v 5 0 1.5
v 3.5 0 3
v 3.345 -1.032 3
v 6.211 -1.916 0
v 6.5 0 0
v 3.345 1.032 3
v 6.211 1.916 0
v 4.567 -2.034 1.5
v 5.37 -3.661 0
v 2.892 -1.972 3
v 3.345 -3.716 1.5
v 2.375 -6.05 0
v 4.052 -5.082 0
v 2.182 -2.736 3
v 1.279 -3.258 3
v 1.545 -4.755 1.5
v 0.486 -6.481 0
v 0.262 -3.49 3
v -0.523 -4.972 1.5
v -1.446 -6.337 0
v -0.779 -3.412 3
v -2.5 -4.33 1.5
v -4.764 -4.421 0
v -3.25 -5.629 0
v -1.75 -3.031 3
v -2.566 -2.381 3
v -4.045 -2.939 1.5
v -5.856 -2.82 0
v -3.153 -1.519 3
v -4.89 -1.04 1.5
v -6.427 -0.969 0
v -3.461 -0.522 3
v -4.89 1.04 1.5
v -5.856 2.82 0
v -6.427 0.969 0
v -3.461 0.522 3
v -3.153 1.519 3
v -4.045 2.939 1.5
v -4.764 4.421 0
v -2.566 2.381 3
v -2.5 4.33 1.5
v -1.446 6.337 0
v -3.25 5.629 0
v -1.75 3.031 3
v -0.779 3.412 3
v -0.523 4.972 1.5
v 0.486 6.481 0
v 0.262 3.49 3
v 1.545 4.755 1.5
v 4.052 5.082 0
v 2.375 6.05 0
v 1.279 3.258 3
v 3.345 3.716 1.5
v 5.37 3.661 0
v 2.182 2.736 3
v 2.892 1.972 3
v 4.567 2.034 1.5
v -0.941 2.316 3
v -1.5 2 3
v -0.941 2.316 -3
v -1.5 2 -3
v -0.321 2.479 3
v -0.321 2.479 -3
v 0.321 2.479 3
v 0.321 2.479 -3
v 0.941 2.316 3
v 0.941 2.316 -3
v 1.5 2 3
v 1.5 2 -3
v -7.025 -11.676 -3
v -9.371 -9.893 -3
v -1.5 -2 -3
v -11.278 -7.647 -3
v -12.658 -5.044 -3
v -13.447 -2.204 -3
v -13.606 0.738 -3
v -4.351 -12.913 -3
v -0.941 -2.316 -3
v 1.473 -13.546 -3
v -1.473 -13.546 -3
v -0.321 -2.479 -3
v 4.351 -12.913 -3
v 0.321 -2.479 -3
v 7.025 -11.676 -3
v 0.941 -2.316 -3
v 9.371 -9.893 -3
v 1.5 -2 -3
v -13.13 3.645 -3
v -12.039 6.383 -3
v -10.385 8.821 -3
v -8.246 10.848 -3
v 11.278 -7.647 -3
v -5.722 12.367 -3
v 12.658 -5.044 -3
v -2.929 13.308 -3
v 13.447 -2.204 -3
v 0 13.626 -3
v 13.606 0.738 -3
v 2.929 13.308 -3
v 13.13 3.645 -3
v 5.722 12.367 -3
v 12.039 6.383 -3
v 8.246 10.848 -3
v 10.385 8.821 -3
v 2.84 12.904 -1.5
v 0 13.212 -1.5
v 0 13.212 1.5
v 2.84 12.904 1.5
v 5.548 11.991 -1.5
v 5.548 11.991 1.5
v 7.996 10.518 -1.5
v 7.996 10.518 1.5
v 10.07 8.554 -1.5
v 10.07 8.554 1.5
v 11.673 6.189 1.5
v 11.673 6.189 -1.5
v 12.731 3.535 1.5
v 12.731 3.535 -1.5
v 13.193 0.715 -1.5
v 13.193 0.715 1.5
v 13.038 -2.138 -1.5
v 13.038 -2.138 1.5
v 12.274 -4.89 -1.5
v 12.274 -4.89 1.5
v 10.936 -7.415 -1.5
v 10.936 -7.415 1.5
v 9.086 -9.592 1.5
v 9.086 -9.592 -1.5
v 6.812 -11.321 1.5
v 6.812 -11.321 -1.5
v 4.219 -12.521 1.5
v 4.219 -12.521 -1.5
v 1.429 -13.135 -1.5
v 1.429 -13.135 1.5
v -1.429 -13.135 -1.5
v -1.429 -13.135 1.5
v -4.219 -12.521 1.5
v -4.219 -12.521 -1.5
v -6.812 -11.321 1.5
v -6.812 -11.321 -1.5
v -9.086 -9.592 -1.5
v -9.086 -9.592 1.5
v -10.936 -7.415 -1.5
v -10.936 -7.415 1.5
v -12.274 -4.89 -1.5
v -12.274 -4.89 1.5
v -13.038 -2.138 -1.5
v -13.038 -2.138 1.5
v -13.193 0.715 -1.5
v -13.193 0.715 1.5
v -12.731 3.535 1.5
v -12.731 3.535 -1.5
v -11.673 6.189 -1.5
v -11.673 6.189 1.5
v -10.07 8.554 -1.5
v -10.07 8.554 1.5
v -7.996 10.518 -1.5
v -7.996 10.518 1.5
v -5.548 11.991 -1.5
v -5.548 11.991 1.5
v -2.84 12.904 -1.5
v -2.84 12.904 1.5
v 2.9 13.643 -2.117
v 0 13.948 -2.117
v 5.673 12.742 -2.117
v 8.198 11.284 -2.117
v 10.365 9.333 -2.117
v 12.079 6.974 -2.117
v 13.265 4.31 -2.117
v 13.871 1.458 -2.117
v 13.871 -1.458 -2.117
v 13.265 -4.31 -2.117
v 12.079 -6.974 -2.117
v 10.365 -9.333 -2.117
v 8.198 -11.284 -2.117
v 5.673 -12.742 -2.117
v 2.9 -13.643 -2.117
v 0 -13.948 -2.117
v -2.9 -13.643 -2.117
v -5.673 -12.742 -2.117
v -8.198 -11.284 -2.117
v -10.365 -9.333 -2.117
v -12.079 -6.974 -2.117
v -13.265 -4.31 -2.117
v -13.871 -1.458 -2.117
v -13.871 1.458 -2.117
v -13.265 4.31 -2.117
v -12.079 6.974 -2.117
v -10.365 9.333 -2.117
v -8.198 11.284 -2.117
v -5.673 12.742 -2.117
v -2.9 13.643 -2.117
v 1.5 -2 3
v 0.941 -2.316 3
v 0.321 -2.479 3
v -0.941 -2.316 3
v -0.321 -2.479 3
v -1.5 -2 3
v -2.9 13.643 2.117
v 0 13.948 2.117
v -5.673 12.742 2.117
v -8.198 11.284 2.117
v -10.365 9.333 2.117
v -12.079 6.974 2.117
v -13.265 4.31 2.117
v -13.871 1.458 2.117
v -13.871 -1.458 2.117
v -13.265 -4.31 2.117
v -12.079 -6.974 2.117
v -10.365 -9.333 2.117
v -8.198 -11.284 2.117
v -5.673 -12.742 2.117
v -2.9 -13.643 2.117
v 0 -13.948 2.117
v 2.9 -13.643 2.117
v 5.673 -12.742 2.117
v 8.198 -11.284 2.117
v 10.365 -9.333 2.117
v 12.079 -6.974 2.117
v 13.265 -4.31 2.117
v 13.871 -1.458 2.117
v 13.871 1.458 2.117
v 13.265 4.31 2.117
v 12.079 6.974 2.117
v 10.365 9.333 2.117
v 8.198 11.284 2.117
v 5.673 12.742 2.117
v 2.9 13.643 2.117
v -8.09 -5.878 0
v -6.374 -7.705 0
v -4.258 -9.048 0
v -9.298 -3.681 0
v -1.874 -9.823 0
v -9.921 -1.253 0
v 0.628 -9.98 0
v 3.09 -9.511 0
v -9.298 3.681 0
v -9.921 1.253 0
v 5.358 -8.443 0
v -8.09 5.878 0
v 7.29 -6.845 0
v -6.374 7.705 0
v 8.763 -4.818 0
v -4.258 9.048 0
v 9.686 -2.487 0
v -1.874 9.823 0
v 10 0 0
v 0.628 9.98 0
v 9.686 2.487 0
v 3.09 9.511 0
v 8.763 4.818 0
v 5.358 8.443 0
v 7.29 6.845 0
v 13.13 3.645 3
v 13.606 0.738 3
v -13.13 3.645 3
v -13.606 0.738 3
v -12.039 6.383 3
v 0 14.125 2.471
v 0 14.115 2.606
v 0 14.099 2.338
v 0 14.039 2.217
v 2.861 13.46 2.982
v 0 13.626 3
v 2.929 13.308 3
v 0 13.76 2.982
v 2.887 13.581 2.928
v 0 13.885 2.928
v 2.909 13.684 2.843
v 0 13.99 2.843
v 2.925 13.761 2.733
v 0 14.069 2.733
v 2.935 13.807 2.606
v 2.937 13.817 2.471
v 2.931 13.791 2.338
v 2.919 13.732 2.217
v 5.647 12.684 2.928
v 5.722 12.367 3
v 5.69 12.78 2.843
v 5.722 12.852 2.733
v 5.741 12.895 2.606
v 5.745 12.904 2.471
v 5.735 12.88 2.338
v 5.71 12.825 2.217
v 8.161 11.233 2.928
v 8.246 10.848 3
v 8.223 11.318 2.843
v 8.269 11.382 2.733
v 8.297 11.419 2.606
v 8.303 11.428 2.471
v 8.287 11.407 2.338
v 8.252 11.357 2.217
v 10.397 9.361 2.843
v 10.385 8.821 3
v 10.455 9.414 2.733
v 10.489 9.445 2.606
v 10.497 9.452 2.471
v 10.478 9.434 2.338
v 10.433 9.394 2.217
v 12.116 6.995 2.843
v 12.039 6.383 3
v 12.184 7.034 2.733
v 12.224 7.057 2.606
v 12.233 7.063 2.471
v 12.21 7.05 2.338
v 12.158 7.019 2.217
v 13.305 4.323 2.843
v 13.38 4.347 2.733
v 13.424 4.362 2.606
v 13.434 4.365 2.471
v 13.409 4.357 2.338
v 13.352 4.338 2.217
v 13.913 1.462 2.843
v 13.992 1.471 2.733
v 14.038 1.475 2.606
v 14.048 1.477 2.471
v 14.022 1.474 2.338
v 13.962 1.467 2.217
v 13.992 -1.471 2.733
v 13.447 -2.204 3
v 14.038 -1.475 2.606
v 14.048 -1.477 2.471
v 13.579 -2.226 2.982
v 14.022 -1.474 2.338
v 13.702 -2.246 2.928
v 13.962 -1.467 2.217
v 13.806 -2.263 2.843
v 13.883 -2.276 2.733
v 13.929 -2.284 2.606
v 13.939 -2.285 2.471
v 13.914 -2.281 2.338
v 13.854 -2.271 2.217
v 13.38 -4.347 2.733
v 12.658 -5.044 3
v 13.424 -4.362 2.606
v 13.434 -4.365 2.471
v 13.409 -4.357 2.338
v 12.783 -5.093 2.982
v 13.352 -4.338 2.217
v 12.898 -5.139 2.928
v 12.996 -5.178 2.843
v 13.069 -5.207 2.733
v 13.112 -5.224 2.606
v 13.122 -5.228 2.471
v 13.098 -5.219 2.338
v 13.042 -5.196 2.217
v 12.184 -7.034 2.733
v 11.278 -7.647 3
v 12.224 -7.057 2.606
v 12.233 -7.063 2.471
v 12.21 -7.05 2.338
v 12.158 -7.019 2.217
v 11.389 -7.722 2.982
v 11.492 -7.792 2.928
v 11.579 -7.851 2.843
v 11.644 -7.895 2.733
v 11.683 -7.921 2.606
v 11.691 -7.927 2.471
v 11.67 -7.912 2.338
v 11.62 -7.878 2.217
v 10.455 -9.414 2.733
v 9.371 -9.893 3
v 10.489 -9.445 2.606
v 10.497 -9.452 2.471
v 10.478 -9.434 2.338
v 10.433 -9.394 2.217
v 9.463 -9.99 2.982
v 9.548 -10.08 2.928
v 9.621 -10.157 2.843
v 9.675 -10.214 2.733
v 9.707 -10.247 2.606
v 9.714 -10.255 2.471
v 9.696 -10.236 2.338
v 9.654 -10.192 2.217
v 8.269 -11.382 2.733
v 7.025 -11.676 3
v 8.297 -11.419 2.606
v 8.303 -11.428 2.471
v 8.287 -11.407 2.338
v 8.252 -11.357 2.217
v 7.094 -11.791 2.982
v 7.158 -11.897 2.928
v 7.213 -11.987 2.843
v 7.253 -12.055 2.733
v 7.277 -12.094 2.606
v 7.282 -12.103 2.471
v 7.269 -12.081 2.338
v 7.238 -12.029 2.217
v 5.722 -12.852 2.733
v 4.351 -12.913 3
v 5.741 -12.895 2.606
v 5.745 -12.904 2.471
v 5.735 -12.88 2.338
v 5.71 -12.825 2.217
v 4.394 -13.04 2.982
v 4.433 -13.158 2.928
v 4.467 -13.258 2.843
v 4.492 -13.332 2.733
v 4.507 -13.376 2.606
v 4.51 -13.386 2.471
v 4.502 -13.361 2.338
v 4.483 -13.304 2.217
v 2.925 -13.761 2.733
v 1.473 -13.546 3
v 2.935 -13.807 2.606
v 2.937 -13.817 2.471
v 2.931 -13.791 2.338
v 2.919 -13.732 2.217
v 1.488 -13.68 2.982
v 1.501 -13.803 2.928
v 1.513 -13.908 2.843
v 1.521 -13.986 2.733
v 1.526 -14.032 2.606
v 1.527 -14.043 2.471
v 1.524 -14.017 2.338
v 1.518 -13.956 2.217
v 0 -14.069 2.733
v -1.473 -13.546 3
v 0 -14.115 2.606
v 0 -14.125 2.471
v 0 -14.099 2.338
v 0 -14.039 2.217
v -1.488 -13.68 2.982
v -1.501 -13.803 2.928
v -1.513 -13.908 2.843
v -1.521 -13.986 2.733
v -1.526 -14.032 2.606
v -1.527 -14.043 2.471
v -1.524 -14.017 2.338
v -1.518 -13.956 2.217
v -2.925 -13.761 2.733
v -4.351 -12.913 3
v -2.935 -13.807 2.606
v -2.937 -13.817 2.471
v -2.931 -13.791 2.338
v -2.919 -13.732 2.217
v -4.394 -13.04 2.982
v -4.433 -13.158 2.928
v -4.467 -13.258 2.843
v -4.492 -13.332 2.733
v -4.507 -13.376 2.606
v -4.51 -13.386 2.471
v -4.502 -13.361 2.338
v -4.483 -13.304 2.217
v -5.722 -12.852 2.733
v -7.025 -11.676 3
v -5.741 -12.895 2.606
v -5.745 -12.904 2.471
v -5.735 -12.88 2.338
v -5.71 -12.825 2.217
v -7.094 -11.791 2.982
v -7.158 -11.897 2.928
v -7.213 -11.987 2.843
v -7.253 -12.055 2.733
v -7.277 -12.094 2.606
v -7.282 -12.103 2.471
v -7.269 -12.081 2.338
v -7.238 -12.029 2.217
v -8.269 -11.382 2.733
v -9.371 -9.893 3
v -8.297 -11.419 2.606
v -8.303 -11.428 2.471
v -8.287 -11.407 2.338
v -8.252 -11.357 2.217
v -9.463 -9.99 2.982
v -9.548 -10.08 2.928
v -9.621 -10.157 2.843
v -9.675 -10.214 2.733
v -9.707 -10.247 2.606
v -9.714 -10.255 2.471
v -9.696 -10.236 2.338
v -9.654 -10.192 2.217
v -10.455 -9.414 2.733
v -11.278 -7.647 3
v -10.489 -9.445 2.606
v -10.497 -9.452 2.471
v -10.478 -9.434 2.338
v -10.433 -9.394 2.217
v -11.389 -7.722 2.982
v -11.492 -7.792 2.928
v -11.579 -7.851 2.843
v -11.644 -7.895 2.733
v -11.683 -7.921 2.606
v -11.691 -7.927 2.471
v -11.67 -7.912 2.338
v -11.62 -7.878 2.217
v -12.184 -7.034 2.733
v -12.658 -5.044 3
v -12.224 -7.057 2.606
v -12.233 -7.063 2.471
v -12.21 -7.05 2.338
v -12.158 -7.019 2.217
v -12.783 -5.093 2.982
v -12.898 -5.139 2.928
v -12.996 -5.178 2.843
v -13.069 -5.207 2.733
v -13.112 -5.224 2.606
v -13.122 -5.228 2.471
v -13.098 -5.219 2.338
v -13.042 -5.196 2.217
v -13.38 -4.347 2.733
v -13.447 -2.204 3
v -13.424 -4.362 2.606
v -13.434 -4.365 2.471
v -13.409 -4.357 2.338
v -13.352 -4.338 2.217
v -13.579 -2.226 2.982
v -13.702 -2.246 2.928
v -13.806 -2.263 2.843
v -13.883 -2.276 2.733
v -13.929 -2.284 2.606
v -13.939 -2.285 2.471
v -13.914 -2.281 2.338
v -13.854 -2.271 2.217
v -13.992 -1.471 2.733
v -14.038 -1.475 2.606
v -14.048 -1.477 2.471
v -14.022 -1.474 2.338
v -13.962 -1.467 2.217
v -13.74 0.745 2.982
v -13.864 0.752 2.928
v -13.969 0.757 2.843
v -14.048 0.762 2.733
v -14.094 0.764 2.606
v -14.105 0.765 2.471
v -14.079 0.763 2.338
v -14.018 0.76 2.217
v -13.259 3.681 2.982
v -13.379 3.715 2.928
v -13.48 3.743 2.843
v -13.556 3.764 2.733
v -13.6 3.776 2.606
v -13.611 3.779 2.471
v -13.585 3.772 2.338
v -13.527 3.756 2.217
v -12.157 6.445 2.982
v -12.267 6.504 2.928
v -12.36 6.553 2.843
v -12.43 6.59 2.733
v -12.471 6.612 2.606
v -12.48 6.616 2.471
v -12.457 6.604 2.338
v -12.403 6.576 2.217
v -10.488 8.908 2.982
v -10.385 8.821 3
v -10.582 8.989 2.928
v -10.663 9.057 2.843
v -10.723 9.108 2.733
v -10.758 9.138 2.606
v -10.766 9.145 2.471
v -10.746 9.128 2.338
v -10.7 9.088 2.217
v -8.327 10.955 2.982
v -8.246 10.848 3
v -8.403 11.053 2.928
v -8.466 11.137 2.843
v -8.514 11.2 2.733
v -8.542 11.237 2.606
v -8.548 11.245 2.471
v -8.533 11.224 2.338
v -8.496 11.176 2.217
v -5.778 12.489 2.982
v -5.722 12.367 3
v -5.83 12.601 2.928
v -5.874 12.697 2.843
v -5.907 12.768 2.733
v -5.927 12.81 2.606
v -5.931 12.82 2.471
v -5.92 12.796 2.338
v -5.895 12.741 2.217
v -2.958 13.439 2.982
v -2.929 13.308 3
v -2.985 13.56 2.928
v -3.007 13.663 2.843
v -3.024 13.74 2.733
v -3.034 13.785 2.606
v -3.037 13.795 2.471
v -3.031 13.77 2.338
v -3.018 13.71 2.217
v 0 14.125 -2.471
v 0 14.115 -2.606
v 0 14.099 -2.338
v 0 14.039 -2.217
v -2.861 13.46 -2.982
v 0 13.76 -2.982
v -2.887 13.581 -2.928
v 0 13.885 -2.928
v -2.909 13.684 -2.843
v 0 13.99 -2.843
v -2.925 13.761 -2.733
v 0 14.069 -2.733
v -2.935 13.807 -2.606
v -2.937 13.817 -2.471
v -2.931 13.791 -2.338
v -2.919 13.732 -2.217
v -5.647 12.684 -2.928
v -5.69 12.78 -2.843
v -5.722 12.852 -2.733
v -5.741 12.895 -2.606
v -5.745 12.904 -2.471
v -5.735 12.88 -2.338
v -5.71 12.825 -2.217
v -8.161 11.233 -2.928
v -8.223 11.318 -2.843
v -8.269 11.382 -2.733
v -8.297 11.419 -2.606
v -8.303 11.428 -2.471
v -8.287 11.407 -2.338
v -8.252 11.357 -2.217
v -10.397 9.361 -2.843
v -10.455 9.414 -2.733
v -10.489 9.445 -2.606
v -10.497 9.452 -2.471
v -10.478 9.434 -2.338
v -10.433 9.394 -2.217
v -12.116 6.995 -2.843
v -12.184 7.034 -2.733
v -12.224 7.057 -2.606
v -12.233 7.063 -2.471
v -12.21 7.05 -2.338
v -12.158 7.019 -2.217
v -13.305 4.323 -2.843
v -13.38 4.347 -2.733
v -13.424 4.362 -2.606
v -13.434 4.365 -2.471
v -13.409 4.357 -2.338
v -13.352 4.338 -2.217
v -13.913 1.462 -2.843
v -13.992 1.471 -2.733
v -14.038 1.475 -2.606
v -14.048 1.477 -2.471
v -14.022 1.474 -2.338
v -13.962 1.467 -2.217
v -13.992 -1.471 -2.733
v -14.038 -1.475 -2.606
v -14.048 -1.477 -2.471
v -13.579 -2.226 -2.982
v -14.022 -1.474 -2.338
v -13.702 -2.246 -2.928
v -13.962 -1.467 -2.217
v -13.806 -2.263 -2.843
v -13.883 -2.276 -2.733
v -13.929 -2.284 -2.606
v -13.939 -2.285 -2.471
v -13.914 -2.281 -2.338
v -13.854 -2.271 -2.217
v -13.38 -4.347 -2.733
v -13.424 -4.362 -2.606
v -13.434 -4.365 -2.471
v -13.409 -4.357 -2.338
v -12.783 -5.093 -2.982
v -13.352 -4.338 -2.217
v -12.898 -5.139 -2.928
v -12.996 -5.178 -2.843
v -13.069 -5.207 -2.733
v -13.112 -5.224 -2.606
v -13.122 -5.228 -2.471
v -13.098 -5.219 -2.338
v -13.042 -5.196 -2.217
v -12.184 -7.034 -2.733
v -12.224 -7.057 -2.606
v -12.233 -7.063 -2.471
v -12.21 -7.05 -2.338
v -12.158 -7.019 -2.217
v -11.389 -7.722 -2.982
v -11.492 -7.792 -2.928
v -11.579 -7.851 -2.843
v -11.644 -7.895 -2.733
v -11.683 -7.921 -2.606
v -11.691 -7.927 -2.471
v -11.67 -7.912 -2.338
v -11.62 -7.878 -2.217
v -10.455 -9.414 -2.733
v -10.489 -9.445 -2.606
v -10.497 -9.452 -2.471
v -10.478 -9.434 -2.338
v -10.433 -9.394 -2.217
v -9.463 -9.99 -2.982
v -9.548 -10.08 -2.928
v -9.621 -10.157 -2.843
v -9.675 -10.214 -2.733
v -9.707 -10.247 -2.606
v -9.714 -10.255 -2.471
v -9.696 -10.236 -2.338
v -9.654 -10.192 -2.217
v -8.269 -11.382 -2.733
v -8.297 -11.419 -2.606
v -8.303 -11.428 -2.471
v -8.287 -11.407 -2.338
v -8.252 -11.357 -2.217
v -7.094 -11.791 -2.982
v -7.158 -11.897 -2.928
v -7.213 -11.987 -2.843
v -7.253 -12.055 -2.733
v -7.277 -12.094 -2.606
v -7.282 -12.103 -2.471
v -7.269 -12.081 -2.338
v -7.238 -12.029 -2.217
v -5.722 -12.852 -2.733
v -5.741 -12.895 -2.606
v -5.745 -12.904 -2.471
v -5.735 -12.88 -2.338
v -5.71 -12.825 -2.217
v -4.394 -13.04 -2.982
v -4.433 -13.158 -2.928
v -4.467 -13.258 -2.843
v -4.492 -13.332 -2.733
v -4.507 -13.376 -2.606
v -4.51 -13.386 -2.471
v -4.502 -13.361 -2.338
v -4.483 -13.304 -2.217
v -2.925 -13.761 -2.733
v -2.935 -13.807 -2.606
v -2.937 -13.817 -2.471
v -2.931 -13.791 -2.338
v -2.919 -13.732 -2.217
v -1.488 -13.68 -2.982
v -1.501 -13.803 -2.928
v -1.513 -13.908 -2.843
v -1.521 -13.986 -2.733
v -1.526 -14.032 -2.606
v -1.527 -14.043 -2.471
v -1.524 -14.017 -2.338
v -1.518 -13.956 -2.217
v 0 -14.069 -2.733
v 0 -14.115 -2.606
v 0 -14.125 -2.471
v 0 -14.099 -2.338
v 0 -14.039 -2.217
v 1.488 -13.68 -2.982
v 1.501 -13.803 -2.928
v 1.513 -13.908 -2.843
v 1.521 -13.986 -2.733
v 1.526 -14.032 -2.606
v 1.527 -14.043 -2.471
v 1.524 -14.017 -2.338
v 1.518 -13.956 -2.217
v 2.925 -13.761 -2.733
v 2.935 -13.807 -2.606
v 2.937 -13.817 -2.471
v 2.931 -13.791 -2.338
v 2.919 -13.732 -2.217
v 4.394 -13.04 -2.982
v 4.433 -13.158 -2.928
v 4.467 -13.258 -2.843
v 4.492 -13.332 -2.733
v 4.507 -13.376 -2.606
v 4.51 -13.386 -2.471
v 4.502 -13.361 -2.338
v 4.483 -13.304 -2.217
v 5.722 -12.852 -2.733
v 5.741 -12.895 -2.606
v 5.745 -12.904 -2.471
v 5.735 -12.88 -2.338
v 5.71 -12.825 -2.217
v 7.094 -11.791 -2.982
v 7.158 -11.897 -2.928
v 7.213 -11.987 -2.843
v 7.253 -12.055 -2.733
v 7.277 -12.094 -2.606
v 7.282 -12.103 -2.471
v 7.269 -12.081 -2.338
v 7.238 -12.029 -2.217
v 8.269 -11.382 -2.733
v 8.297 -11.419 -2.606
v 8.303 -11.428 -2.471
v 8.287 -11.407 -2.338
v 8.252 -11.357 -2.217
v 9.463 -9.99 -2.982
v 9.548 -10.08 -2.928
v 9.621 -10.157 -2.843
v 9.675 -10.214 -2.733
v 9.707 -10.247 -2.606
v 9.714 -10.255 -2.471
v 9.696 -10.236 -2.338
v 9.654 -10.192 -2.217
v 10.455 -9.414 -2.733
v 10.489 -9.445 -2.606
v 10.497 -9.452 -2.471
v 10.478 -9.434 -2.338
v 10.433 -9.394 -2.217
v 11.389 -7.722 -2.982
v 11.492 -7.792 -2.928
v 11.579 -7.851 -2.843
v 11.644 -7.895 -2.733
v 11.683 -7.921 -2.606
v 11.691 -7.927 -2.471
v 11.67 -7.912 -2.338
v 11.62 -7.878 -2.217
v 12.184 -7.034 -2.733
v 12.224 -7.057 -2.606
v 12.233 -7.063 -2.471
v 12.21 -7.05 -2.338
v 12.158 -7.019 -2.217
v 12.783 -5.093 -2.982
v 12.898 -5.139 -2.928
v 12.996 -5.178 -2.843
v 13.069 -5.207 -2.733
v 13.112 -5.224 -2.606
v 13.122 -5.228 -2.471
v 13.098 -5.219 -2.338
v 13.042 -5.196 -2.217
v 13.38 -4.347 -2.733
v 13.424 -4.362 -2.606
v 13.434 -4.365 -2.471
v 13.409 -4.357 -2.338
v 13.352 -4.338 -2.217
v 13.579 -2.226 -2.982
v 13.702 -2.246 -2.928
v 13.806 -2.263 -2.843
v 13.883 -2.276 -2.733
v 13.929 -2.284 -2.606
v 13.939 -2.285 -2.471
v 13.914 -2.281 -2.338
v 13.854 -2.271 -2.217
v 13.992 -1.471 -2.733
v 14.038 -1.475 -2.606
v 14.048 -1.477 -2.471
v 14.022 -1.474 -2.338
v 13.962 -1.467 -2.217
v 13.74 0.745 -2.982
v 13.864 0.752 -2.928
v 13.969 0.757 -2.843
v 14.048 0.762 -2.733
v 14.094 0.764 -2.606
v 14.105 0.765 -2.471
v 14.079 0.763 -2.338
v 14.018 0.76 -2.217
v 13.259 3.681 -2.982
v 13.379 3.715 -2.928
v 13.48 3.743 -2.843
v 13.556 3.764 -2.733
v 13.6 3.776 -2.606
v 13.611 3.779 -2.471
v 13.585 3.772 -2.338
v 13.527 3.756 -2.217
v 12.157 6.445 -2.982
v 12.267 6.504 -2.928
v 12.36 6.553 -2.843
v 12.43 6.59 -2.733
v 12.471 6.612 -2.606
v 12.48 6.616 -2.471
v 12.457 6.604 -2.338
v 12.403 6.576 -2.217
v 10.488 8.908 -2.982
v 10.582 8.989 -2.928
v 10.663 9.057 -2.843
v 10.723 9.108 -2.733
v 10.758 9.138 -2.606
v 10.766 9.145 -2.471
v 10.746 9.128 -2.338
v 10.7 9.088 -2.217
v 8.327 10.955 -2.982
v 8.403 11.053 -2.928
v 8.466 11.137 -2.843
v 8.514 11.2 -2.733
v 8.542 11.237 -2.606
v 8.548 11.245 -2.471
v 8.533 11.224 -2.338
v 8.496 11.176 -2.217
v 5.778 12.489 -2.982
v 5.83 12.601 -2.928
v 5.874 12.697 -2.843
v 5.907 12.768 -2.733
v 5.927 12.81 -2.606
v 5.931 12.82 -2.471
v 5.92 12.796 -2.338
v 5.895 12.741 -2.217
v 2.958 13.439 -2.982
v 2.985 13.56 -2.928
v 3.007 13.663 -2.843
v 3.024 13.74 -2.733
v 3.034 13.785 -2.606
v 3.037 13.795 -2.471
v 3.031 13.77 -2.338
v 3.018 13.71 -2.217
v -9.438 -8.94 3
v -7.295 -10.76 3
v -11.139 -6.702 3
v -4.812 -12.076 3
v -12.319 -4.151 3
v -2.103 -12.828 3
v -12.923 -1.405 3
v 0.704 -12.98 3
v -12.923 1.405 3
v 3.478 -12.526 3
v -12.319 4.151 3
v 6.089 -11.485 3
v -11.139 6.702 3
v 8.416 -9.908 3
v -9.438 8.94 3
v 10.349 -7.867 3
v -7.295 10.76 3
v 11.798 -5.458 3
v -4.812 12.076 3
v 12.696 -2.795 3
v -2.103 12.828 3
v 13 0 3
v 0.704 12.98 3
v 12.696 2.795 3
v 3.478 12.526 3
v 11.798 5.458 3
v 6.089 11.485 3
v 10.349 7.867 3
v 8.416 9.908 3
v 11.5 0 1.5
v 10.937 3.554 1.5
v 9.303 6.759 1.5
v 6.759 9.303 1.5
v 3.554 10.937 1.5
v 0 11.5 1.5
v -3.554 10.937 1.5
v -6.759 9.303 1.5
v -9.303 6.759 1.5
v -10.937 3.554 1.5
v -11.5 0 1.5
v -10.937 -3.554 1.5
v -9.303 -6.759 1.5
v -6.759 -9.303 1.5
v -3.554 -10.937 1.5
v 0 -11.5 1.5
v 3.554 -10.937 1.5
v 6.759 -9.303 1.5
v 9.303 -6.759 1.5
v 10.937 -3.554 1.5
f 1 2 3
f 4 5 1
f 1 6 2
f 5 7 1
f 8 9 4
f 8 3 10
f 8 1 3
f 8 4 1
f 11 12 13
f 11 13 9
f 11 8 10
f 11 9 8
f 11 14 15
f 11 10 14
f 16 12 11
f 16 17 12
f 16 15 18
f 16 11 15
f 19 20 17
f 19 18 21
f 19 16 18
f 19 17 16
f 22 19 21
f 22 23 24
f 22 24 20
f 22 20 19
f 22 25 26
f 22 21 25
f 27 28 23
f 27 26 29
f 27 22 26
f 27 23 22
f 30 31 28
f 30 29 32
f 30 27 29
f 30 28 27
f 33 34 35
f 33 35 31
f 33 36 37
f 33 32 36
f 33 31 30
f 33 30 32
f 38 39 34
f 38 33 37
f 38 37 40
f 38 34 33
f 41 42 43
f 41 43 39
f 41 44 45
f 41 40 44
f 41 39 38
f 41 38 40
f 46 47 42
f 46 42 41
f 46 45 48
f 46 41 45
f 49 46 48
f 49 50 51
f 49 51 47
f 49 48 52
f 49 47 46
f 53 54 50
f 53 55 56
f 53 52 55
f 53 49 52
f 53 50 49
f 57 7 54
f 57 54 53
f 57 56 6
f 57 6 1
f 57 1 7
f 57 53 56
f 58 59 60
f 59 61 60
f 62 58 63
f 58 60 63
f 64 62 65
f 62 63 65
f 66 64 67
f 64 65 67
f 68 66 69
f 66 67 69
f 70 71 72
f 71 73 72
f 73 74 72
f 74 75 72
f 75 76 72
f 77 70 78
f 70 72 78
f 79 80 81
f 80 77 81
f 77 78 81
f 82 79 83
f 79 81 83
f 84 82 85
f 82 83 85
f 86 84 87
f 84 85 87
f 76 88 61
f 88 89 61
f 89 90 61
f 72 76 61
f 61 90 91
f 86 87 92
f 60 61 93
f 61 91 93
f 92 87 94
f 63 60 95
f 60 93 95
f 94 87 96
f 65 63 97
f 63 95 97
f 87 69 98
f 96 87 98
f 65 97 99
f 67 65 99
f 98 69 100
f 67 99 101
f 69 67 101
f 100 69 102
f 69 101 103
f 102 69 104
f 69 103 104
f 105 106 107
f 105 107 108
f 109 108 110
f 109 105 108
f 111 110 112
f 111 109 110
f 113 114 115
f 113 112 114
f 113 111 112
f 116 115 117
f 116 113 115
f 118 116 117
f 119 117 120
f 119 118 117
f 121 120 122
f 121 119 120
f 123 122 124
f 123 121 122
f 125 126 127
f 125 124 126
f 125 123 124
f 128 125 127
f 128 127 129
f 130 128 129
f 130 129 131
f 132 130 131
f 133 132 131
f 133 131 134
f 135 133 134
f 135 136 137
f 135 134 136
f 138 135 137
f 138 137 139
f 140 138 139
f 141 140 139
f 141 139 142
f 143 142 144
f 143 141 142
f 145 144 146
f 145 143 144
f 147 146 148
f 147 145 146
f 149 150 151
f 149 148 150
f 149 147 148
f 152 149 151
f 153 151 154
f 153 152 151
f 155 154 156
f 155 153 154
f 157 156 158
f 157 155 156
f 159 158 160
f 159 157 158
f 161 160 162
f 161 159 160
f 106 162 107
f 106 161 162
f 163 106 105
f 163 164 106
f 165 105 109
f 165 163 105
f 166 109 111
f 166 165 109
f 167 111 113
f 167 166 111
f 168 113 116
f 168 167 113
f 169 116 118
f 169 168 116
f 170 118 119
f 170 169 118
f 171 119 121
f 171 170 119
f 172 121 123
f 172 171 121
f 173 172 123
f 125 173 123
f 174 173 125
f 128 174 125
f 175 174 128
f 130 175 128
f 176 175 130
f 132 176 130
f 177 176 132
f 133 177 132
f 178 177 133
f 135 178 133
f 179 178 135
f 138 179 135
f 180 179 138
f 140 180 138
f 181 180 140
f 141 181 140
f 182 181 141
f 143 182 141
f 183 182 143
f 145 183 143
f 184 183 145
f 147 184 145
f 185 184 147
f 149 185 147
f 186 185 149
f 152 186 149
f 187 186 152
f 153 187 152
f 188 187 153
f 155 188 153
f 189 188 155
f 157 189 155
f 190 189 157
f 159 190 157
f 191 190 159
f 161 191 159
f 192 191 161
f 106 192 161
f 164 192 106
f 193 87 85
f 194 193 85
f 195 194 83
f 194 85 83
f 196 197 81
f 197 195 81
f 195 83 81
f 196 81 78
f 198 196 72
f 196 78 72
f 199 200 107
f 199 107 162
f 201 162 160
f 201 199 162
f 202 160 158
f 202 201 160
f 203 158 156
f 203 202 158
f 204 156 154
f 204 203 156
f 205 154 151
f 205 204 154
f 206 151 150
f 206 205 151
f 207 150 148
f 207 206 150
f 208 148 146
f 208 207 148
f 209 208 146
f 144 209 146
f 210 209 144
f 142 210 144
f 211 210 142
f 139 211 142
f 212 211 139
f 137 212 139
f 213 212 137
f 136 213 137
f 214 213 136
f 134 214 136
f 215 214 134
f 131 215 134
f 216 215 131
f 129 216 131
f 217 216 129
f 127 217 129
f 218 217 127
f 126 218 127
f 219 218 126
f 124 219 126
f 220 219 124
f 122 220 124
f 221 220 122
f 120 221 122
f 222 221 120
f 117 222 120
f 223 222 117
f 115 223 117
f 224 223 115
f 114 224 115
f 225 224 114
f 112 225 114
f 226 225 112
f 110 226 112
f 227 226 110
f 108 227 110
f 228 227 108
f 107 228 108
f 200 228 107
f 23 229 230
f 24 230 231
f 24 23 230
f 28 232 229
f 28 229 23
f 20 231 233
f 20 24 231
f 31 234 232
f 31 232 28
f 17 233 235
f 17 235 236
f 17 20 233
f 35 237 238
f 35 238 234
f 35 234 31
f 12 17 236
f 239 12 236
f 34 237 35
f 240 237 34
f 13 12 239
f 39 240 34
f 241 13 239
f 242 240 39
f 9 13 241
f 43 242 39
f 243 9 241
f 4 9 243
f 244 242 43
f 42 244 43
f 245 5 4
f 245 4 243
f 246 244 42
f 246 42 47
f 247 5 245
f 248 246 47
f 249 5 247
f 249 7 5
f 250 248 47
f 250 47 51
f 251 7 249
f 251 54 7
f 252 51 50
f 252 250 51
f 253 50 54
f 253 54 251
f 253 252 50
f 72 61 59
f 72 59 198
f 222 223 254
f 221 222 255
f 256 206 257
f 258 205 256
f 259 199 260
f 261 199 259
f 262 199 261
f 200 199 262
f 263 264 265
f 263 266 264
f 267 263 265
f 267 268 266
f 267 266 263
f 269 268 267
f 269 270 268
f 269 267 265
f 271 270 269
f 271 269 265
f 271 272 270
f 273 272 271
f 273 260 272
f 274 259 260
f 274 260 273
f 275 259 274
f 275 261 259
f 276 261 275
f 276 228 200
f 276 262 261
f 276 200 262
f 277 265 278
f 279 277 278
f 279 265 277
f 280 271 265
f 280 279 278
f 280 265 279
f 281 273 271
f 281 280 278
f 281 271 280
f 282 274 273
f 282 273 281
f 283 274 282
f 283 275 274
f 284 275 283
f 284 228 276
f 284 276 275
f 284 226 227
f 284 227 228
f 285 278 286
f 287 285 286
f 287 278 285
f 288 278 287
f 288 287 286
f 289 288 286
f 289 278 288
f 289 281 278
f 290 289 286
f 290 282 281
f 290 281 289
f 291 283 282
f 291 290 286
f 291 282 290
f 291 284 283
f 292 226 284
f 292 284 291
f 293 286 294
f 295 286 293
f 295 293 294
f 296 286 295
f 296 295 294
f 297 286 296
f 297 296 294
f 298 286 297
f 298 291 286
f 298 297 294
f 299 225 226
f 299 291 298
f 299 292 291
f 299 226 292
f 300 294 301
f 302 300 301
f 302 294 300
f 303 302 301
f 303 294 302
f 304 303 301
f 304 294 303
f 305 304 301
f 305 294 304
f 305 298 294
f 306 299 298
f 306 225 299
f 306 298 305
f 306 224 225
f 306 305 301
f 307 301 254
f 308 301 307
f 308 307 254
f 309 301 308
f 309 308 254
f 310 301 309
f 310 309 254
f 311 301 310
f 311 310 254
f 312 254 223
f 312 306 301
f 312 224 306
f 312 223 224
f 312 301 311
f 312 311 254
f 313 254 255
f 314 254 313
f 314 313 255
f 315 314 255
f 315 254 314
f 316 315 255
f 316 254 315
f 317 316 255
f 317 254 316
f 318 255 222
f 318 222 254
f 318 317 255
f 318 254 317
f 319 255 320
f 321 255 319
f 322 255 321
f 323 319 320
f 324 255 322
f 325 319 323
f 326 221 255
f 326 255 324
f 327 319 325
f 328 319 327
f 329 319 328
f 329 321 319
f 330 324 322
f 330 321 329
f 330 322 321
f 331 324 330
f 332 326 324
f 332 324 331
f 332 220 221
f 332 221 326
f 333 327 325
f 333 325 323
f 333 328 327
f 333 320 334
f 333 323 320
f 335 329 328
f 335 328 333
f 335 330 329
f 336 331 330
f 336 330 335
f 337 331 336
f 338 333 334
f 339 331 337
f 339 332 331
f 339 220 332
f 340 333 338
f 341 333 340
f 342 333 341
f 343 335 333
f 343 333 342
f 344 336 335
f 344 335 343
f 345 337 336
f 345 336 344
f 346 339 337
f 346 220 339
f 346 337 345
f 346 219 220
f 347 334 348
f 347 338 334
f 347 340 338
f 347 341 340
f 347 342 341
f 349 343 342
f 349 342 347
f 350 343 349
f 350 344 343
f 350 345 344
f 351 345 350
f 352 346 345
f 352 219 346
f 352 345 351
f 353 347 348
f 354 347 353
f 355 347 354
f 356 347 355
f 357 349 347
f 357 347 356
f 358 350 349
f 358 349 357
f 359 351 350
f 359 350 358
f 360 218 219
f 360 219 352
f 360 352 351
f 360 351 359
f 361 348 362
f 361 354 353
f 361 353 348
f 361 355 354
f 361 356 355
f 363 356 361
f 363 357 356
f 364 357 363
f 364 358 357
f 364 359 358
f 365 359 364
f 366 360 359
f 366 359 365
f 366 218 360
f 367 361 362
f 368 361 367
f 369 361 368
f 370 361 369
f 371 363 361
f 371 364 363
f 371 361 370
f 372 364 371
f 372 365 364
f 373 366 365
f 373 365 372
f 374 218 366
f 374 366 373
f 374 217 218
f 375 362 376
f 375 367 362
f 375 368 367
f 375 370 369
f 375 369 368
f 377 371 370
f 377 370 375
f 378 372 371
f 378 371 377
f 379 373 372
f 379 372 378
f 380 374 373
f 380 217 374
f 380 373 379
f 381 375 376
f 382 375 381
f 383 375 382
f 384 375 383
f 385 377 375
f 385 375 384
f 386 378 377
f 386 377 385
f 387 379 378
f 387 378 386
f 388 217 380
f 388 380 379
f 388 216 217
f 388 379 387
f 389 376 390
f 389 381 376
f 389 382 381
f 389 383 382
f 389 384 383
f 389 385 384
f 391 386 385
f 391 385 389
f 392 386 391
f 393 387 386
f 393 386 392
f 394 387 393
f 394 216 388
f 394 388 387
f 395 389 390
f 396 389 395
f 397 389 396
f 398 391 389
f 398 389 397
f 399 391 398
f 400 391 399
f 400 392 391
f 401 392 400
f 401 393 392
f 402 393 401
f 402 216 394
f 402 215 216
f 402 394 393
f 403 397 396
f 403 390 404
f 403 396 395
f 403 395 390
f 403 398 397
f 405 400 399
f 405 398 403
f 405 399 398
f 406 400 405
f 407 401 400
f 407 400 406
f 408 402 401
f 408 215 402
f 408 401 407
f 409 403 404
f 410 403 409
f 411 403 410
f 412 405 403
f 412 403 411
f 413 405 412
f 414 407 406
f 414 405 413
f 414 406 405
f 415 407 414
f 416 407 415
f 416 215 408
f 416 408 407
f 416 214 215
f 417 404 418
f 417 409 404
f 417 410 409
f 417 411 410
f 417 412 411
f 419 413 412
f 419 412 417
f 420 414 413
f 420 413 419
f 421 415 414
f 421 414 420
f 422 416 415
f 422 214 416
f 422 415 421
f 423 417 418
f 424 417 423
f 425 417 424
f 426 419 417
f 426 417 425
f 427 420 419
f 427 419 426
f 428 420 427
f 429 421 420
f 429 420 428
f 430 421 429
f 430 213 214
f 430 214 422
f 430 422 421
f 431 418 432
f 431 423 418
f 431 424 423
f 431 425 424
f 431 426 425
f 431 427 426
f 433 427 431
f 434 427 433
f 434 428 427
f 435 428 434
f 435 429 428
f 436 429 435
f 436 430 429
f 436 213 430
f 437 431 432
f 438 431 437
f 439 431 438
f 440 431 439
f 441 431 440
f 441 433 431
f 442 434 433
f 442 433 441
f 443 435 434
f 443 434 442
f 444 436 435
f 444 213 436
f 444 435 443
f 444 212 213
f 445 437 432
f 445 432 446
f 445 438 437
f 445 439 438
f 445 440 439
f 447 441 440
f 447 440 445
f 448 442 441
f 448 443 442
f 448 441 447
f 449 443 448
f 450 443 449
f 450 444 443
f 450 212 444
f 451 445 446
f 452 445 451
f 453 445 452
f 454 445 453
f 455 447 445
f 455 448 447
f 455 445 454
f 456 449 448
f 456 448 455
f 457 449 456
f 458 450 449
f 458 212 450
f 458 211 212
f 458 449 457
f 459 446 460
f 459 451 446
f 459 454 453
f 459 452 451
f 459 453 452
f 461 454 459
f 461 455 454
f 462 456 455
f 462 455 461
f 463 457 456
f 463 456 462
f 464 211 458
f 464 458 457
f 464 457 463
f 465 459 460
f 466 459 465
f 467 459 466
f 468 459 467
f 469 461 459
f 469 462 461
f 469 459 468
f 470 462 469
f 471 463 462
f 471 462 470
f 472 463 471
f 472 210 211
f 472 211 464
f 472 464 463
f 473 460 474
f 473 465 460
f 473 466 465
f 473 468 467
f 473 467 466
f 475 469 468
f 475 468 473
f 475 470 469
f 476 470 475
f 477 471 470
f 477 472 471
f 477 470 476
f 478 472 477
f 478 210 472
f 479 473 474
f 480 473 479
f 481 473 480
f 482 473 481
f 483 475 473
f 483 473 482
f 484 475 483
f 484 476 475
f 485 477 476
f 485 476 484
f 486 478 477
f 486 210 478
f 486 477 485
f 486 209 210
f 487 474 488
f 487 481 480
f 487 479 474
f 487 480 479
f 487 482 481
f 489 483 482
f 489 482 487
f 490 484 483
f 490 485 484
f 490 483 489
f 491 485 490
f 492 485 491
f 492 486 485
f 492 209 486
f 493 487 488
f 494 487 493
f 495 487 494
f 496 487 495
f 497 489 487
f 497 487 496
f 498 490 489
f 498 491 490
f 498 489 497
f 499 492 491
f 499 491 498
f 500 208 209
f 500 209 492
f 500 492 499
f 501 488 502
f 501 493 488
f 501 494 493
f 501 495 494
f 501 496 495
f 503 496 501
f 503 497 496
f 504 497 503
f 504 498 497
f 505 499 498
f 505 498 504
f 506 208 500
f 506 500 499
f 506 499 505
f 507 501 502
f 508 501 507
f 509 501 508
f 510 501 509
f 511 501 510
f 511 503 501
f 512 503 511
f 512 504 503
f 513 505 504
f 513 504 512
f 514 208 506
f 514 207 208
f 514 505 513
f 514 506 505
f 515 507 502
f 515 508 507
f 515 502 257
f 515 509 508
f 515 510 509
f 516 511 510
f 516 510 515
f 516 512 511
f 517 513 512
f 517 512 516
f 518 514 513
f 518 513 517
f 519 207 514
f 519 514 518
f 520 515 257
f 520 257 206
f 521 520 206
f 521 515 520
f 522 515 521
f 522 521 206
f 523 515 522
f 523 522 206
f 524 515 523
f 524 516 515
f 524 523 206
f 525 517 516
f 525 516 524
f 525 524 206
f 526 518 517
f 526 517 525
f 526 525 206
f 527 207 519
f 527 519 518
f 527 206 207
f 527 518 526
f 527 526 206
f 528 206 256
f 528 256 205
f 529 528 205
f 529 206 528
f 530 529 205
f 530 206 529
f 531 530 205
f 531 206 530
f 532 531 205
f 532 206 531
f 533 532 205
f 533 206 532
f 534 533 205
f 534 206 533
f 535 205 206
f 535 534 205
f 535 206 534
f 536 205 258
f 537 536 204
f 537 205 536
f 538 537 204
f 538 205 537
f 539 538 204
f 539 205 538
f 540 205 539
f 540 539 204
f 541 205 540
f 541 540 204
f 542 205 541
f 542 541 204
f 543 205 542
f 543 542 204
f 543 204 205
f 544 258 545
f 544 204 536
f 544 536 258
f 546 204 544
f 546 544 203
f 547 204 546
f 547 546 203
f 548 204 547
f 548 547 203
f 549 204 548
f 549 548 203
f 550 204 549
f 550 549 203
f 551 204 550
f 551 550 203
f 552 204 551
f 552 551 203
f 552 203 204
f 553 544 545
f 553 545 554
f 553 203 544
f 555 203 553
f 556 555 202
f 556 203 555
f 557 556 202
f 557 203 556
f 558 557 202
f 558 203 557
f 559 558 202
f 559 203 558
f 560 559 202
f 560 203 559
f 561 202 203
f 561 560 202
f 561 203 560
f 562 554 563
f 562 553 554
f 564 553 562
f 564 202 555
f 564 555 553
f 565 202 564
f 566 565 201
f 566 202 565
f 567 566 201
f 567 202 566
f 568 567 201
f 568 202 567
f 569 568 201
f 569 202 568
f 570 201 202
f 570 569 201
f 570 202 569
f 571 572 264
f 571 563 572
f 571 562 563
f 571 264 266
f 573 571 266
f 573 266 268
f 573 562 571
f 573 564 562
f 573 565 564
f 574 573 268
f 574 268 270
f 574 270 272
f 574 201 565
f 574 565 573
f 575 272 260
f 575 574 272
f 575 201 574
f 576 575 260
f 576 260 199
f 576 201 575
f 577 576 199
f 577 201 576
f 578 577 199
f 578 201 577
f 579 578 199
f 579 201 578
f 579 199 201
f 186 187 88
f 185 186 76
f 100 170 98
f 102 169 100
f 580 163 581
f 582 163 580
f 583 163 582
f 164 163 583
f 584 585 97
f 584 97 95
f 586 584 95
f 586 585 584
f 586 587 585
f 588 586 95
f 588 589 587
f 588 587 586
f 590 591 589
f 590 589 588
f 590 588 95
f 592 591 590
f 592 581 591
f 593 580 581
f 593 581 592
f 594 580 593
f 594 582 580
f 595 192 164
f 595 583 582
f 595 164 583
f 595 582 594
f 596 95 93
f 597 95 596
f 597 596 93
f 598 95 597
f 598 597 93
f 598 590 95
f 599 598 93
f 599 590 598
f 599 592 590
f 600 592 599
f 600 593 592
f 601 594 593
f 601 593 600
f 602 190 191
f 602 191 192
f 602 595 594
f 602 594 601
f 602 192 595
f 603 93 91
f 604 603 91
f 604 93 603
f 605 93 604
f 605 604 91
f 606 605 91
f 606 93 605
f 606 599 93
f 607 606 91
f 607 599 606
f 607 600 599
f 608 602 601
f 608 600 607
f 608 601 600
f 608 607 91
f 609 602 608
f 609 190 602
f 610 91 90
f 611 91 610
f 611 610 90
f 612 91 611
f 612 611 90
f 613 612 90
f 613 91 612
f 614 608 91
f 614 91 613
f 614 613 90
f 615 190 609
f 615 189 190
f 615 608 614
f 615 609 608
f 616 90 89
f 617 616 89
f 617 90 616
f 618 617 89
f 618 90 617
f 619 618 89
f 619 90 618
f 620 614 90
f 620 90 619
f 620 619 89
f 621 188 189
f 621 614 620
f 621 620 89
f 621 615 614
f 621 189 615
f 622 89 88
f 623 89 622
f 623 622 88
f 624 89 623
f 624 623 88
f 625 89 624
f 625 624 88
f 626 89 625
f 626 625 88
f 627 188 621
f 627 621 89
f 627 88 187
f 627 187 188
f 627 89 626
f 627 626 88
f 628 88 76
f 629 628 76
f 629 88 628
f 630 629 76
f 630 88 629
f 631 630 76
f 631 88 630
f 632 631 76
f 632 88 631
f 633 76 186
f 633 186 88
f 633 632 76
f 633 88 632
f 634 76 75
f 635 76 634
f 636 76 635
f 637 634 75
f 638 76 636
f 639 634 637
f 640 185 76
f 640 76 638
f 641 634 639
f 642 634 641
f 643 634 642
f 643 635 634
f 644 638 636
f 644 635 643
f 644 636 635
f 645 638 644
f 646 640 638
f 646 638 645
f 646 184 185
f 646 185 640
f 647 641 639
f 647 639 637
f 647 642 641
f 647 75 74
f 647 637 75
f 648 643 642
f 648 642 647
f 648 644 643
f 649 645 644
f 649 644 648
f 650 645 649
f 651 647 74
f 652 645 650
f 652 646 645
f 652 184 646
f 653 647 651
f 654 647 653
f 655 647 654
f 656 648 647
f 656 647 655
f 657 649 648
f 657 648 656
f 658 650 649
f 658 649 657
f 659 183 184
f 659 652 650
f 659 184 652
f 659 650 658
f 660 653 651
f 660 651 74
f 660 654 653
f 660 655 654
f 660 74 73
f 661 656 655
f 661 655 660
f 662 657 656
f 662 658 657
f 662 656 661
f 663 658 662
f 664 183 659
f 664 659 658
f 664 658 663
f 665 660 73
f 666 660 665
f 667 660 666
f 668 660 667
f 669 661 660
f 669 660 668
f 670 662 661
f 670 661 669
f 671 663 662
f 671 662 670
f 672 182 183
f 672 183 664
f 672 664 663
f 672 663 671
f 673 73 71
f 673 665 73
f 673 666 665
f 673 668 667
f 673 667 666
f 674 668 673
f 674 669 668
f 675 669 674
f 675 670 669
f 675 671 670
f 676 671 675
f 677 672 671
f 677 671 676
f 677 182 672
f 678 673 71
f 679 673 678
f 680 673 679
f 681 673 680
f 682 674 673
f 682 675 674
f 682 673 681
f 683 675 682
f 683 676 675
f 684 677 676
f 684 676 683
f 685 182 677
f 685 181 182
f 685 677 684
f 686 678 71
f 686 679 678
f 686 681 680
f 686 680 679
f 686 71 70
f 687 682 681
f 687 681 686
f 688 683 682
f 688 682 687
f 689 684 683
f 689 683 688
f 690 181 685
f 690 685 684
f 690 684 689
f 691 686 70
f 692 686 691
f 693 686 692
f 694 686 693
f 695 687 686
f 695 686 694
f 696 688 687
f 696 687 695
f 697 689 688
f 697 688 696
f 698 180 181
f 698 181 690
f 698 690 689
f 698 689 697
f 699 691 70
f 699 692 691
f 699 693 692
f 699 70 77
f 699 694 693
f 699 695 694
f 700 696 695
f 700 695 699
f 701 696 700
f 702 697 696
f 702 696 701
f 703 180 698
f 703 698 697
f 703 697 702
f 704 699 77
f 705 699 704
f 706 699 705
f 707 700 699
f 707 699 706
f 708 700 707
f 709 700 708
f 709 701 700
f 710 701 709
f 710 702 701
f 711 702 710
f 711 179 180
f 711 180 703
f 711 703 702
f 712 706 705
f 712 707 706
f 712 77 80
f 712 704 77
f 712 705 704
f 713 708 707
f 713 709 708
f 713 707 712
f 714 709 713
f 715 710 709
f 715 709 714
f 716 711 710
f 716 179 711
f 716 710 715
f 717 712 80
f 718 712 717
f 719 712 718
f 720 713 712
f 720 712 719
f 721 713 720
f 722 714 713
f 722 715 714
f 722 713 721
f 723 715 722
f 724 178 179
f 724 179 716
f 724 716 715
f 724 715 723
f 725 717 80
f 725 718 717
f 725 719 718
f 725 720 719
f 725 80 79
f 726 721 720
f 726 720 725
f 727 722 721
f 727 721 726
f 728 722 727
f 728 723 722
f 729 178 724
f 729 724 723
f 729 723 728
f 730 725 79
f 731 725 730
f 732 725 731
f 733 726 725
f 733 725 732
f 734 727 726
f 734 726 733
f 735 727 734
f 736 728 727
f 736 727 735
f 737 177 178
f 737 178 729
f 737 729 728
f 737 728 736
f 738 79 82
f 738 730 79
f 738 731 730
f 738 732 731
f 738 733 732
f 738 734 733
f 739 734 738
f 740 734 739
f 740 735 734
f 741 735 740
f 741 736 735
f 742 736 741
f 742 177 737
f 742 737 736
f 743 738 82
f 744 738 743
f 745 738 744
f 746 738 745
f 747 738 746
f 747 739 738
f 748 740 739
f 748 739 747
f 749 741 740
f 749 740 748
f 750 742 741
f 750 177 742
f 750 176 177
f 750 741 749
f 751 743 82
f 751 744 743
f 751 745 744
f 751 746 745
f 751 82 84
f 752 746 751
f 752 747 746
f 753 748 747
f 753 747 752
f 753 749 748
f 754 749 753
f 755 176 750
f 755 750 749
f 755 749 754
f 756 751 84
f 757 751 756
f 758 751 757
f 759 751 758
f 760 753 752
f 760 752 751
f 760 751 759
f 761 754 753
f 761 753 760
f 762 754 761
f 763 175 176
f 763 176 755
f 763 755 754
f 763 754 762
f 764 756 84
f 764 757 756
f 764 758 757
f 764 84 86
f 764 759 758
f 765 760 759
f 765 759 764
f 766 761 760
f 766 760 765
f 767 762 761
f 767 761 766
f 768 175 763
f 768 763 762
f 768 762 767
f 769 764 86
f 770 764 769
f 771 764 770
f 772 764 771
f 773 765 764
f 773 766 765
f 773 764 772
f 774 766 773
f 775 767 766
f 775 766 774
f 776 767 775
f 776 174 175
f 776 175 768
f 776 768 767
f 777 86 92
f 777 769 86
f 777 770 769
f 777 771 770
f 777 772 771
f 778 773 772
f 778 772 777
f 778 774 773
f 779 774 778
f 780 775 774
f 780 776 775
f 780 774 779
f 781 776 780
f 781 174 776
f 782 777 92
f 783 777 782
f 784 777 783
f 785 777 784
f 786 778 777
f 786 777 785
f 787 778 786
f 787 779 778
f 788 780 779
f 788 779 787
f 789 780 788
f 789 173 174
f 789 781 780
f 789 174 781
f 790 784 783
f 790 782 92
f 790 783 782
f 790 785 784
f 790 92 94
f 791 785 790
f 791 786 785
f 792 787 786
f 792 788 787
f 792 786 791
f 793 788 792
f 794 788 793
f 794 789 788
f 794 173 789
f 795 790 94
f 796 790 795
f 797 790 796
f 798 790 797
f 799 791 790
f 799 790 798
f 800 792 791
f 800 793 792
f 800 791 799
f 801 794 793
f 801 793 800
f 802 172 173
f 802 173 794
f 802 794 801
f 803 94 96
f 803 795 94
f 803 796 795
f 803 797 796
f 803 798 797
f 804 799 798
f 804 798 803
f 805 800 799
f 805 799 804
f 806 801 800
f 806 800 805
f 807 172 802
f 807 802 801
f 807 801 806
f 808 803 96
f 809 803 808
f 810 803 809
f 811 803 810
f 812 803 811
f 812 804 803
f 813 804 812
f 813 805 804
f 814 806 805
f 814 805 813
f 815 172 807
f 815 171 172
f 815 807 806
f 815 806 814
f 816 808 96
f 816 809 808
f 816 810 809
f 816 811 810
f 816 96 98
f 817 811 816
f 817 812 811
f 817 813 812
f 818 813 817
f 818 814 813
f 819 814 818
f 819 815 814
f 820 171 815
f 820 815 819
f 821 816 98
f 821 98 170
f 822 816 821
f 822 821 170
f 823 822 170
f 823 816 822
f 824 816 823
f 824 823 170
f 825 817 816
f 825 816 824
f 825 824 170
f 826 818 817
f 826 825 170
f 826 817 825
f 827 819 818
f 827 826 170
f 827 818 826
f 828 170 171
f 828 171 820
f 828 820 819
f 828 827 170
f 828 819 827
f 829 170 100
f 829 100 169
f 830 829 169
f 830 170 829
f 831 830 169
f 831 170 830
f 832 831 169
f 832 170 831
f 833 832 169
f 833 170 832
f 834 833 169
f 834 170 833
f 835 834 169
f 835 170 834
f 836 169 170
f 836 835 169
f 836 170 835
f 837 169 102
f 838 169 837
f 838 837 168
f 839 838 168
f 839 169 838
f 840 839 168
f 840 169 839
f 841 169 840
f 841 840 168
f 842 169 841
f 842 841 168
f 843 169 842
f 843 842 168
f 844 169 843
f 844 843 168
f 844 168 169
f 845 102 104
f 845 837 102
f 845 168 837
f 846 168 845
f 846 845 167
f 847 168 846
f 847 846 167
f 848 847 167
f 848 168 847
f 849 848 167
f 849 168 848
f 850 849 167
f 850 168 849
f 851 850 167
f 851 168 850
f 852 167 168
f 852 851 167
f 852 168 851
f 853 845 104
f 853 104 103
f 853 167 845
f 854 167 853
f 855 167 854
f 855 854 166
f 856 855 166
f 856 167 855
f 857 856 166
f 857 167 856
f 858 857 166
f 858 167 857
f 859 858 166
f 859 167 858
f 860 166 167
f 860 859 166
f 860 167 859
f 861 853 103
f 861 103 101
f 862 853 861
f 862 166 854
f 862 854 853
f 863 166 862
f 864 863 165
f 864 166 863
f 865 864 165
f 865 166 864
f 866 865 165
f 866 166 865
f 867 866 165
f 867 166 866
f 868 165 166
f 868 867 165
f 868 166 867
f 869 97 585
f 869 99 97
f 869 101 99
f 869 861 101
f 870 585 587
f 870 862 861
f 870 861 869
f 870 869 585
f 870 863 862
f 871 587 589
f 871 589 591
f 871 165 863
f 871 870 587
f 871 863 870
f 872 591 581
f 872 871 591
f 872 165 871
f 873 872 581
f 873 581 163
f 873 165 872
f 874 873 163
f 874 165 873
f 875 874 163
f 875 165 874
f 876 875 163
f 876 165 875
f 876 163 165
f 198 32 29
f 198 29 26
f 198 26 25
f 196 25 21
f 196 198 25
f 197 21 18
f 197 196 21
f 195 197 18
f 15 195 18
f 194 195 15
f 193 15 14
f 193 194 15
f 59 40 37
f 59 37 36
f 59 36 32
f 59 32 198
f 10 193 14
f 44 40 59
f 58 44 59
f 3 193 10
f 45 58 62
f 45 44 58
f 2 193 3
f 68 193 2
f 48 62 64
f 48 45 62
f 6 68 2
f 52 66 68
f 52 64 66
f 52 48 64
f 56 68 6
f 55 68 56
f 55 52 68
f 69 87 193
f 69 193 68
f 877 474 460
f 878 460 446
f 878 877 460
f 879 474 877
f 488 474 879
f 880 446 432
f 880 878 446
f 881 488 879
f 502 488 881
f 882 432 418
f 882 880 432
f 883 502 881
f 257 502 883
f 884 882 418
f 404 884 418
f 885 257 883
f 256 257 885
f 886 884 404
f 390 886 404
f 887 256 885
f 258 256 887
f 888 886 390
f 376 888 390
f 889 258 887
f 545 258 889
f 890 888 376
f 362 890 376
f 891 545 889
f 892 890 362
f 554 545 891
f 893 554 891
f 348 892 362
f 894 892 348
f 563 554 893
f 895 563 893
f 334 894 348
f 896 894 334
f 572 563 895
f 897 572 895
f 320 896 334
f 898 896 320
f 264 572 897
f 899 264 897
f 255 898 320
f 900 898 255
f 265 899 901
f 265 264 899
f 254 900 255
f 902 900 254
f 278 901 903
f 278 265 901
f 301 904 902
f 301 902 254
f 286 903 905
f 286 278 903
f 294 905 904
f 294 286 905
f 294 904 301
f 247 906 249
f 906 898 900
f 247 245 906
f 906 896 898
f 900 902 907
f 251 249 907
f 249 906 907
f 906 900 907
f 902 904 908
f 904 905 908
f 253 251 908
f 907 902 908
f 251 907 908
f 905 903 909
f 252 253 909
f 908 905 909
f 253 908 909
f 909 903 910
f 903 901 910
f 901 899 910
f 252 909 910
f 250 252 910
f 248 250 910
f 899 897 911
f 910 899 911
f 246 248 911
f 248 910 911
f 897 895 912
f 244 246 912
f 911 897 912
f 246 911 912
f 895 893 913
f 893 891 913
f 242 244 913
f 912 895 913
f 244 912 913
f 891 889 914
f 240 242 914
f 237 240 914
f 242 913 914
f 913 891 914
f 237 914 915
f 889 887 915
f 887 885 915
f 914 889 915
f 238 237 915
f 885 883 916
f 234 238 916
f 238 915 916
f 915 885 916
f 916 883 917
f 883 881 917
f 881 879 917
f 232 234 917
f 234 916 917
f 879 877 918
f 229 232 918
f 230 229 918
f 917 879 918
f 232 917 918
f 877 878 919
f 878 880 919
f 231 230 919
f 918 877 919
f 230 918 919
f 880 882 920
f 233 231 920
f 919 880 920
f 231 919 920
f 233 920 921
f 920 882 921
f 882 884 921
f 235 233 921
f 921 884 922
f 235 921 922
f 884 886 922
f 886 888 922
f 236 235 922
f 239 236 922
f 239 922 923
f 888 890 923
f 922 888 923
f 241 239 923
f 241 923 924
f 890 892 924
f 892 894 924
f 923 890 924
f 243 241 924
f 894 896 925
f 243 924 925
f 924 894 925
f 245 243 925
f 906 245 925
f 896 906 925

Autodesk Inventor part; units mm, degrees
ref_plane "YZ Plane" through (0, 0, 0) normal (1, 0, 0) x (0, 1, 0)
ref_plane "XZ Plane" through (0, 0, 0) normal (0, 1, 0) x (-1, 0, 0)
ref_plane "XY Plane" through (0, 0, 0) normal (0, 0, 1) x (1, 0, 0)
sketch "Náčrt1" plane through (0, 0, 0) normal (0, 0, 1) x (1, 0, 0)
  circle A0 centre (0, 0) radius 2.5
  line L0 (-1.5, -2.5) -> (1.5, -2.5)
  line L1 (1.5, -2.5) -> (1.5, 2.5)
  line L2 (1.5, 2.5) -> (-1.5, 2.5)
  line L3 (-1.5, 2.5) -> (-1.5, -2.5)
  line L4 (-1.5, -2.5) -> (1.5, 2.5) construction
  line L5 (1.5, -2.5) -> (-1.5, 2.5) construction
  circle A1 centre (0, 0) radius 15
  point P0 (-1.5, -2)
  point P1 (-1.5, 2)
  point P2 (1.5, 2)
  point P3 (1.5, -2)
  dimension "d0" = 5
  dimension "d1" = 3
  dimension "d2" = 5
  dimension "d3" = 30
extrude "Vysunutí1" add sketch "Náčrt1" along normal mid plane 6 contours A0 L1 | A0 L2 L1 | L1 L0 A0 | A0 L3 L2 | L0 L3 A0 | L3 A0 | A1
sketch "Náčrt2" plane through (0, 0, 0) normal (1, 0, 0) x (0, 1, 0)
  line L0 (-15, -3) -> (15, -3) projected
  line L1 (15, 3) -> (15, -3)
  line L2 (15, -3) -> (13.2124, -1.5)
  line L3 (15, -3) -> (17.3336, -3) construction
  line L4 (15, 3) -> (-15, 3) projected
  line L5 (15, 3) -> (13.2124, 1.5)
  line L6 (15, 3) -> (17.3336, 3) construction
  line L7 (13.2124, 1.5) -> (13.2124, -1.5)
  line L8 (0, -7) -> (0, 7) projected
  point P0 (0, 0)
  dimension "d15" = 140
  dimension "d16" = 140
  dimension "d18" = 3
  dimension "d27" = 13.2124
  dimension "d28" = 1.5
revolve "Rotace1" cut sketch "Náčrt2" angle 360 about axis through (0, 0, -10) along (0, 0, 1) contours L2 L7 L5 L1
fillet "Zaoblení1" radius 0.5 2 edges at (0, -15, -3) (0, -15, 3)
sketch "Náčrt3" plane through (0, 0, 3) normal (0, 0, 1) x (1, 0, 0)
  circle A0 centre (0, 0) radius 3.5
  circle A1 centre (0, 0) radius 10
  dimension "d12" = 7
  dimension "d13" = 20
extrude "Vysunutí2" cut sketch "Náčrt3" against normal blind 3
chamfer "Zkosení1" distance 3 angle 45 1 edges at (-10, 0, 3)
chamfer "Zkosení2" distance 3 angle 45 1 edges at (-3.5, 0, 0)
equation "\"d15\" = d16"
properties part number "rub-ring_3D tisk"
